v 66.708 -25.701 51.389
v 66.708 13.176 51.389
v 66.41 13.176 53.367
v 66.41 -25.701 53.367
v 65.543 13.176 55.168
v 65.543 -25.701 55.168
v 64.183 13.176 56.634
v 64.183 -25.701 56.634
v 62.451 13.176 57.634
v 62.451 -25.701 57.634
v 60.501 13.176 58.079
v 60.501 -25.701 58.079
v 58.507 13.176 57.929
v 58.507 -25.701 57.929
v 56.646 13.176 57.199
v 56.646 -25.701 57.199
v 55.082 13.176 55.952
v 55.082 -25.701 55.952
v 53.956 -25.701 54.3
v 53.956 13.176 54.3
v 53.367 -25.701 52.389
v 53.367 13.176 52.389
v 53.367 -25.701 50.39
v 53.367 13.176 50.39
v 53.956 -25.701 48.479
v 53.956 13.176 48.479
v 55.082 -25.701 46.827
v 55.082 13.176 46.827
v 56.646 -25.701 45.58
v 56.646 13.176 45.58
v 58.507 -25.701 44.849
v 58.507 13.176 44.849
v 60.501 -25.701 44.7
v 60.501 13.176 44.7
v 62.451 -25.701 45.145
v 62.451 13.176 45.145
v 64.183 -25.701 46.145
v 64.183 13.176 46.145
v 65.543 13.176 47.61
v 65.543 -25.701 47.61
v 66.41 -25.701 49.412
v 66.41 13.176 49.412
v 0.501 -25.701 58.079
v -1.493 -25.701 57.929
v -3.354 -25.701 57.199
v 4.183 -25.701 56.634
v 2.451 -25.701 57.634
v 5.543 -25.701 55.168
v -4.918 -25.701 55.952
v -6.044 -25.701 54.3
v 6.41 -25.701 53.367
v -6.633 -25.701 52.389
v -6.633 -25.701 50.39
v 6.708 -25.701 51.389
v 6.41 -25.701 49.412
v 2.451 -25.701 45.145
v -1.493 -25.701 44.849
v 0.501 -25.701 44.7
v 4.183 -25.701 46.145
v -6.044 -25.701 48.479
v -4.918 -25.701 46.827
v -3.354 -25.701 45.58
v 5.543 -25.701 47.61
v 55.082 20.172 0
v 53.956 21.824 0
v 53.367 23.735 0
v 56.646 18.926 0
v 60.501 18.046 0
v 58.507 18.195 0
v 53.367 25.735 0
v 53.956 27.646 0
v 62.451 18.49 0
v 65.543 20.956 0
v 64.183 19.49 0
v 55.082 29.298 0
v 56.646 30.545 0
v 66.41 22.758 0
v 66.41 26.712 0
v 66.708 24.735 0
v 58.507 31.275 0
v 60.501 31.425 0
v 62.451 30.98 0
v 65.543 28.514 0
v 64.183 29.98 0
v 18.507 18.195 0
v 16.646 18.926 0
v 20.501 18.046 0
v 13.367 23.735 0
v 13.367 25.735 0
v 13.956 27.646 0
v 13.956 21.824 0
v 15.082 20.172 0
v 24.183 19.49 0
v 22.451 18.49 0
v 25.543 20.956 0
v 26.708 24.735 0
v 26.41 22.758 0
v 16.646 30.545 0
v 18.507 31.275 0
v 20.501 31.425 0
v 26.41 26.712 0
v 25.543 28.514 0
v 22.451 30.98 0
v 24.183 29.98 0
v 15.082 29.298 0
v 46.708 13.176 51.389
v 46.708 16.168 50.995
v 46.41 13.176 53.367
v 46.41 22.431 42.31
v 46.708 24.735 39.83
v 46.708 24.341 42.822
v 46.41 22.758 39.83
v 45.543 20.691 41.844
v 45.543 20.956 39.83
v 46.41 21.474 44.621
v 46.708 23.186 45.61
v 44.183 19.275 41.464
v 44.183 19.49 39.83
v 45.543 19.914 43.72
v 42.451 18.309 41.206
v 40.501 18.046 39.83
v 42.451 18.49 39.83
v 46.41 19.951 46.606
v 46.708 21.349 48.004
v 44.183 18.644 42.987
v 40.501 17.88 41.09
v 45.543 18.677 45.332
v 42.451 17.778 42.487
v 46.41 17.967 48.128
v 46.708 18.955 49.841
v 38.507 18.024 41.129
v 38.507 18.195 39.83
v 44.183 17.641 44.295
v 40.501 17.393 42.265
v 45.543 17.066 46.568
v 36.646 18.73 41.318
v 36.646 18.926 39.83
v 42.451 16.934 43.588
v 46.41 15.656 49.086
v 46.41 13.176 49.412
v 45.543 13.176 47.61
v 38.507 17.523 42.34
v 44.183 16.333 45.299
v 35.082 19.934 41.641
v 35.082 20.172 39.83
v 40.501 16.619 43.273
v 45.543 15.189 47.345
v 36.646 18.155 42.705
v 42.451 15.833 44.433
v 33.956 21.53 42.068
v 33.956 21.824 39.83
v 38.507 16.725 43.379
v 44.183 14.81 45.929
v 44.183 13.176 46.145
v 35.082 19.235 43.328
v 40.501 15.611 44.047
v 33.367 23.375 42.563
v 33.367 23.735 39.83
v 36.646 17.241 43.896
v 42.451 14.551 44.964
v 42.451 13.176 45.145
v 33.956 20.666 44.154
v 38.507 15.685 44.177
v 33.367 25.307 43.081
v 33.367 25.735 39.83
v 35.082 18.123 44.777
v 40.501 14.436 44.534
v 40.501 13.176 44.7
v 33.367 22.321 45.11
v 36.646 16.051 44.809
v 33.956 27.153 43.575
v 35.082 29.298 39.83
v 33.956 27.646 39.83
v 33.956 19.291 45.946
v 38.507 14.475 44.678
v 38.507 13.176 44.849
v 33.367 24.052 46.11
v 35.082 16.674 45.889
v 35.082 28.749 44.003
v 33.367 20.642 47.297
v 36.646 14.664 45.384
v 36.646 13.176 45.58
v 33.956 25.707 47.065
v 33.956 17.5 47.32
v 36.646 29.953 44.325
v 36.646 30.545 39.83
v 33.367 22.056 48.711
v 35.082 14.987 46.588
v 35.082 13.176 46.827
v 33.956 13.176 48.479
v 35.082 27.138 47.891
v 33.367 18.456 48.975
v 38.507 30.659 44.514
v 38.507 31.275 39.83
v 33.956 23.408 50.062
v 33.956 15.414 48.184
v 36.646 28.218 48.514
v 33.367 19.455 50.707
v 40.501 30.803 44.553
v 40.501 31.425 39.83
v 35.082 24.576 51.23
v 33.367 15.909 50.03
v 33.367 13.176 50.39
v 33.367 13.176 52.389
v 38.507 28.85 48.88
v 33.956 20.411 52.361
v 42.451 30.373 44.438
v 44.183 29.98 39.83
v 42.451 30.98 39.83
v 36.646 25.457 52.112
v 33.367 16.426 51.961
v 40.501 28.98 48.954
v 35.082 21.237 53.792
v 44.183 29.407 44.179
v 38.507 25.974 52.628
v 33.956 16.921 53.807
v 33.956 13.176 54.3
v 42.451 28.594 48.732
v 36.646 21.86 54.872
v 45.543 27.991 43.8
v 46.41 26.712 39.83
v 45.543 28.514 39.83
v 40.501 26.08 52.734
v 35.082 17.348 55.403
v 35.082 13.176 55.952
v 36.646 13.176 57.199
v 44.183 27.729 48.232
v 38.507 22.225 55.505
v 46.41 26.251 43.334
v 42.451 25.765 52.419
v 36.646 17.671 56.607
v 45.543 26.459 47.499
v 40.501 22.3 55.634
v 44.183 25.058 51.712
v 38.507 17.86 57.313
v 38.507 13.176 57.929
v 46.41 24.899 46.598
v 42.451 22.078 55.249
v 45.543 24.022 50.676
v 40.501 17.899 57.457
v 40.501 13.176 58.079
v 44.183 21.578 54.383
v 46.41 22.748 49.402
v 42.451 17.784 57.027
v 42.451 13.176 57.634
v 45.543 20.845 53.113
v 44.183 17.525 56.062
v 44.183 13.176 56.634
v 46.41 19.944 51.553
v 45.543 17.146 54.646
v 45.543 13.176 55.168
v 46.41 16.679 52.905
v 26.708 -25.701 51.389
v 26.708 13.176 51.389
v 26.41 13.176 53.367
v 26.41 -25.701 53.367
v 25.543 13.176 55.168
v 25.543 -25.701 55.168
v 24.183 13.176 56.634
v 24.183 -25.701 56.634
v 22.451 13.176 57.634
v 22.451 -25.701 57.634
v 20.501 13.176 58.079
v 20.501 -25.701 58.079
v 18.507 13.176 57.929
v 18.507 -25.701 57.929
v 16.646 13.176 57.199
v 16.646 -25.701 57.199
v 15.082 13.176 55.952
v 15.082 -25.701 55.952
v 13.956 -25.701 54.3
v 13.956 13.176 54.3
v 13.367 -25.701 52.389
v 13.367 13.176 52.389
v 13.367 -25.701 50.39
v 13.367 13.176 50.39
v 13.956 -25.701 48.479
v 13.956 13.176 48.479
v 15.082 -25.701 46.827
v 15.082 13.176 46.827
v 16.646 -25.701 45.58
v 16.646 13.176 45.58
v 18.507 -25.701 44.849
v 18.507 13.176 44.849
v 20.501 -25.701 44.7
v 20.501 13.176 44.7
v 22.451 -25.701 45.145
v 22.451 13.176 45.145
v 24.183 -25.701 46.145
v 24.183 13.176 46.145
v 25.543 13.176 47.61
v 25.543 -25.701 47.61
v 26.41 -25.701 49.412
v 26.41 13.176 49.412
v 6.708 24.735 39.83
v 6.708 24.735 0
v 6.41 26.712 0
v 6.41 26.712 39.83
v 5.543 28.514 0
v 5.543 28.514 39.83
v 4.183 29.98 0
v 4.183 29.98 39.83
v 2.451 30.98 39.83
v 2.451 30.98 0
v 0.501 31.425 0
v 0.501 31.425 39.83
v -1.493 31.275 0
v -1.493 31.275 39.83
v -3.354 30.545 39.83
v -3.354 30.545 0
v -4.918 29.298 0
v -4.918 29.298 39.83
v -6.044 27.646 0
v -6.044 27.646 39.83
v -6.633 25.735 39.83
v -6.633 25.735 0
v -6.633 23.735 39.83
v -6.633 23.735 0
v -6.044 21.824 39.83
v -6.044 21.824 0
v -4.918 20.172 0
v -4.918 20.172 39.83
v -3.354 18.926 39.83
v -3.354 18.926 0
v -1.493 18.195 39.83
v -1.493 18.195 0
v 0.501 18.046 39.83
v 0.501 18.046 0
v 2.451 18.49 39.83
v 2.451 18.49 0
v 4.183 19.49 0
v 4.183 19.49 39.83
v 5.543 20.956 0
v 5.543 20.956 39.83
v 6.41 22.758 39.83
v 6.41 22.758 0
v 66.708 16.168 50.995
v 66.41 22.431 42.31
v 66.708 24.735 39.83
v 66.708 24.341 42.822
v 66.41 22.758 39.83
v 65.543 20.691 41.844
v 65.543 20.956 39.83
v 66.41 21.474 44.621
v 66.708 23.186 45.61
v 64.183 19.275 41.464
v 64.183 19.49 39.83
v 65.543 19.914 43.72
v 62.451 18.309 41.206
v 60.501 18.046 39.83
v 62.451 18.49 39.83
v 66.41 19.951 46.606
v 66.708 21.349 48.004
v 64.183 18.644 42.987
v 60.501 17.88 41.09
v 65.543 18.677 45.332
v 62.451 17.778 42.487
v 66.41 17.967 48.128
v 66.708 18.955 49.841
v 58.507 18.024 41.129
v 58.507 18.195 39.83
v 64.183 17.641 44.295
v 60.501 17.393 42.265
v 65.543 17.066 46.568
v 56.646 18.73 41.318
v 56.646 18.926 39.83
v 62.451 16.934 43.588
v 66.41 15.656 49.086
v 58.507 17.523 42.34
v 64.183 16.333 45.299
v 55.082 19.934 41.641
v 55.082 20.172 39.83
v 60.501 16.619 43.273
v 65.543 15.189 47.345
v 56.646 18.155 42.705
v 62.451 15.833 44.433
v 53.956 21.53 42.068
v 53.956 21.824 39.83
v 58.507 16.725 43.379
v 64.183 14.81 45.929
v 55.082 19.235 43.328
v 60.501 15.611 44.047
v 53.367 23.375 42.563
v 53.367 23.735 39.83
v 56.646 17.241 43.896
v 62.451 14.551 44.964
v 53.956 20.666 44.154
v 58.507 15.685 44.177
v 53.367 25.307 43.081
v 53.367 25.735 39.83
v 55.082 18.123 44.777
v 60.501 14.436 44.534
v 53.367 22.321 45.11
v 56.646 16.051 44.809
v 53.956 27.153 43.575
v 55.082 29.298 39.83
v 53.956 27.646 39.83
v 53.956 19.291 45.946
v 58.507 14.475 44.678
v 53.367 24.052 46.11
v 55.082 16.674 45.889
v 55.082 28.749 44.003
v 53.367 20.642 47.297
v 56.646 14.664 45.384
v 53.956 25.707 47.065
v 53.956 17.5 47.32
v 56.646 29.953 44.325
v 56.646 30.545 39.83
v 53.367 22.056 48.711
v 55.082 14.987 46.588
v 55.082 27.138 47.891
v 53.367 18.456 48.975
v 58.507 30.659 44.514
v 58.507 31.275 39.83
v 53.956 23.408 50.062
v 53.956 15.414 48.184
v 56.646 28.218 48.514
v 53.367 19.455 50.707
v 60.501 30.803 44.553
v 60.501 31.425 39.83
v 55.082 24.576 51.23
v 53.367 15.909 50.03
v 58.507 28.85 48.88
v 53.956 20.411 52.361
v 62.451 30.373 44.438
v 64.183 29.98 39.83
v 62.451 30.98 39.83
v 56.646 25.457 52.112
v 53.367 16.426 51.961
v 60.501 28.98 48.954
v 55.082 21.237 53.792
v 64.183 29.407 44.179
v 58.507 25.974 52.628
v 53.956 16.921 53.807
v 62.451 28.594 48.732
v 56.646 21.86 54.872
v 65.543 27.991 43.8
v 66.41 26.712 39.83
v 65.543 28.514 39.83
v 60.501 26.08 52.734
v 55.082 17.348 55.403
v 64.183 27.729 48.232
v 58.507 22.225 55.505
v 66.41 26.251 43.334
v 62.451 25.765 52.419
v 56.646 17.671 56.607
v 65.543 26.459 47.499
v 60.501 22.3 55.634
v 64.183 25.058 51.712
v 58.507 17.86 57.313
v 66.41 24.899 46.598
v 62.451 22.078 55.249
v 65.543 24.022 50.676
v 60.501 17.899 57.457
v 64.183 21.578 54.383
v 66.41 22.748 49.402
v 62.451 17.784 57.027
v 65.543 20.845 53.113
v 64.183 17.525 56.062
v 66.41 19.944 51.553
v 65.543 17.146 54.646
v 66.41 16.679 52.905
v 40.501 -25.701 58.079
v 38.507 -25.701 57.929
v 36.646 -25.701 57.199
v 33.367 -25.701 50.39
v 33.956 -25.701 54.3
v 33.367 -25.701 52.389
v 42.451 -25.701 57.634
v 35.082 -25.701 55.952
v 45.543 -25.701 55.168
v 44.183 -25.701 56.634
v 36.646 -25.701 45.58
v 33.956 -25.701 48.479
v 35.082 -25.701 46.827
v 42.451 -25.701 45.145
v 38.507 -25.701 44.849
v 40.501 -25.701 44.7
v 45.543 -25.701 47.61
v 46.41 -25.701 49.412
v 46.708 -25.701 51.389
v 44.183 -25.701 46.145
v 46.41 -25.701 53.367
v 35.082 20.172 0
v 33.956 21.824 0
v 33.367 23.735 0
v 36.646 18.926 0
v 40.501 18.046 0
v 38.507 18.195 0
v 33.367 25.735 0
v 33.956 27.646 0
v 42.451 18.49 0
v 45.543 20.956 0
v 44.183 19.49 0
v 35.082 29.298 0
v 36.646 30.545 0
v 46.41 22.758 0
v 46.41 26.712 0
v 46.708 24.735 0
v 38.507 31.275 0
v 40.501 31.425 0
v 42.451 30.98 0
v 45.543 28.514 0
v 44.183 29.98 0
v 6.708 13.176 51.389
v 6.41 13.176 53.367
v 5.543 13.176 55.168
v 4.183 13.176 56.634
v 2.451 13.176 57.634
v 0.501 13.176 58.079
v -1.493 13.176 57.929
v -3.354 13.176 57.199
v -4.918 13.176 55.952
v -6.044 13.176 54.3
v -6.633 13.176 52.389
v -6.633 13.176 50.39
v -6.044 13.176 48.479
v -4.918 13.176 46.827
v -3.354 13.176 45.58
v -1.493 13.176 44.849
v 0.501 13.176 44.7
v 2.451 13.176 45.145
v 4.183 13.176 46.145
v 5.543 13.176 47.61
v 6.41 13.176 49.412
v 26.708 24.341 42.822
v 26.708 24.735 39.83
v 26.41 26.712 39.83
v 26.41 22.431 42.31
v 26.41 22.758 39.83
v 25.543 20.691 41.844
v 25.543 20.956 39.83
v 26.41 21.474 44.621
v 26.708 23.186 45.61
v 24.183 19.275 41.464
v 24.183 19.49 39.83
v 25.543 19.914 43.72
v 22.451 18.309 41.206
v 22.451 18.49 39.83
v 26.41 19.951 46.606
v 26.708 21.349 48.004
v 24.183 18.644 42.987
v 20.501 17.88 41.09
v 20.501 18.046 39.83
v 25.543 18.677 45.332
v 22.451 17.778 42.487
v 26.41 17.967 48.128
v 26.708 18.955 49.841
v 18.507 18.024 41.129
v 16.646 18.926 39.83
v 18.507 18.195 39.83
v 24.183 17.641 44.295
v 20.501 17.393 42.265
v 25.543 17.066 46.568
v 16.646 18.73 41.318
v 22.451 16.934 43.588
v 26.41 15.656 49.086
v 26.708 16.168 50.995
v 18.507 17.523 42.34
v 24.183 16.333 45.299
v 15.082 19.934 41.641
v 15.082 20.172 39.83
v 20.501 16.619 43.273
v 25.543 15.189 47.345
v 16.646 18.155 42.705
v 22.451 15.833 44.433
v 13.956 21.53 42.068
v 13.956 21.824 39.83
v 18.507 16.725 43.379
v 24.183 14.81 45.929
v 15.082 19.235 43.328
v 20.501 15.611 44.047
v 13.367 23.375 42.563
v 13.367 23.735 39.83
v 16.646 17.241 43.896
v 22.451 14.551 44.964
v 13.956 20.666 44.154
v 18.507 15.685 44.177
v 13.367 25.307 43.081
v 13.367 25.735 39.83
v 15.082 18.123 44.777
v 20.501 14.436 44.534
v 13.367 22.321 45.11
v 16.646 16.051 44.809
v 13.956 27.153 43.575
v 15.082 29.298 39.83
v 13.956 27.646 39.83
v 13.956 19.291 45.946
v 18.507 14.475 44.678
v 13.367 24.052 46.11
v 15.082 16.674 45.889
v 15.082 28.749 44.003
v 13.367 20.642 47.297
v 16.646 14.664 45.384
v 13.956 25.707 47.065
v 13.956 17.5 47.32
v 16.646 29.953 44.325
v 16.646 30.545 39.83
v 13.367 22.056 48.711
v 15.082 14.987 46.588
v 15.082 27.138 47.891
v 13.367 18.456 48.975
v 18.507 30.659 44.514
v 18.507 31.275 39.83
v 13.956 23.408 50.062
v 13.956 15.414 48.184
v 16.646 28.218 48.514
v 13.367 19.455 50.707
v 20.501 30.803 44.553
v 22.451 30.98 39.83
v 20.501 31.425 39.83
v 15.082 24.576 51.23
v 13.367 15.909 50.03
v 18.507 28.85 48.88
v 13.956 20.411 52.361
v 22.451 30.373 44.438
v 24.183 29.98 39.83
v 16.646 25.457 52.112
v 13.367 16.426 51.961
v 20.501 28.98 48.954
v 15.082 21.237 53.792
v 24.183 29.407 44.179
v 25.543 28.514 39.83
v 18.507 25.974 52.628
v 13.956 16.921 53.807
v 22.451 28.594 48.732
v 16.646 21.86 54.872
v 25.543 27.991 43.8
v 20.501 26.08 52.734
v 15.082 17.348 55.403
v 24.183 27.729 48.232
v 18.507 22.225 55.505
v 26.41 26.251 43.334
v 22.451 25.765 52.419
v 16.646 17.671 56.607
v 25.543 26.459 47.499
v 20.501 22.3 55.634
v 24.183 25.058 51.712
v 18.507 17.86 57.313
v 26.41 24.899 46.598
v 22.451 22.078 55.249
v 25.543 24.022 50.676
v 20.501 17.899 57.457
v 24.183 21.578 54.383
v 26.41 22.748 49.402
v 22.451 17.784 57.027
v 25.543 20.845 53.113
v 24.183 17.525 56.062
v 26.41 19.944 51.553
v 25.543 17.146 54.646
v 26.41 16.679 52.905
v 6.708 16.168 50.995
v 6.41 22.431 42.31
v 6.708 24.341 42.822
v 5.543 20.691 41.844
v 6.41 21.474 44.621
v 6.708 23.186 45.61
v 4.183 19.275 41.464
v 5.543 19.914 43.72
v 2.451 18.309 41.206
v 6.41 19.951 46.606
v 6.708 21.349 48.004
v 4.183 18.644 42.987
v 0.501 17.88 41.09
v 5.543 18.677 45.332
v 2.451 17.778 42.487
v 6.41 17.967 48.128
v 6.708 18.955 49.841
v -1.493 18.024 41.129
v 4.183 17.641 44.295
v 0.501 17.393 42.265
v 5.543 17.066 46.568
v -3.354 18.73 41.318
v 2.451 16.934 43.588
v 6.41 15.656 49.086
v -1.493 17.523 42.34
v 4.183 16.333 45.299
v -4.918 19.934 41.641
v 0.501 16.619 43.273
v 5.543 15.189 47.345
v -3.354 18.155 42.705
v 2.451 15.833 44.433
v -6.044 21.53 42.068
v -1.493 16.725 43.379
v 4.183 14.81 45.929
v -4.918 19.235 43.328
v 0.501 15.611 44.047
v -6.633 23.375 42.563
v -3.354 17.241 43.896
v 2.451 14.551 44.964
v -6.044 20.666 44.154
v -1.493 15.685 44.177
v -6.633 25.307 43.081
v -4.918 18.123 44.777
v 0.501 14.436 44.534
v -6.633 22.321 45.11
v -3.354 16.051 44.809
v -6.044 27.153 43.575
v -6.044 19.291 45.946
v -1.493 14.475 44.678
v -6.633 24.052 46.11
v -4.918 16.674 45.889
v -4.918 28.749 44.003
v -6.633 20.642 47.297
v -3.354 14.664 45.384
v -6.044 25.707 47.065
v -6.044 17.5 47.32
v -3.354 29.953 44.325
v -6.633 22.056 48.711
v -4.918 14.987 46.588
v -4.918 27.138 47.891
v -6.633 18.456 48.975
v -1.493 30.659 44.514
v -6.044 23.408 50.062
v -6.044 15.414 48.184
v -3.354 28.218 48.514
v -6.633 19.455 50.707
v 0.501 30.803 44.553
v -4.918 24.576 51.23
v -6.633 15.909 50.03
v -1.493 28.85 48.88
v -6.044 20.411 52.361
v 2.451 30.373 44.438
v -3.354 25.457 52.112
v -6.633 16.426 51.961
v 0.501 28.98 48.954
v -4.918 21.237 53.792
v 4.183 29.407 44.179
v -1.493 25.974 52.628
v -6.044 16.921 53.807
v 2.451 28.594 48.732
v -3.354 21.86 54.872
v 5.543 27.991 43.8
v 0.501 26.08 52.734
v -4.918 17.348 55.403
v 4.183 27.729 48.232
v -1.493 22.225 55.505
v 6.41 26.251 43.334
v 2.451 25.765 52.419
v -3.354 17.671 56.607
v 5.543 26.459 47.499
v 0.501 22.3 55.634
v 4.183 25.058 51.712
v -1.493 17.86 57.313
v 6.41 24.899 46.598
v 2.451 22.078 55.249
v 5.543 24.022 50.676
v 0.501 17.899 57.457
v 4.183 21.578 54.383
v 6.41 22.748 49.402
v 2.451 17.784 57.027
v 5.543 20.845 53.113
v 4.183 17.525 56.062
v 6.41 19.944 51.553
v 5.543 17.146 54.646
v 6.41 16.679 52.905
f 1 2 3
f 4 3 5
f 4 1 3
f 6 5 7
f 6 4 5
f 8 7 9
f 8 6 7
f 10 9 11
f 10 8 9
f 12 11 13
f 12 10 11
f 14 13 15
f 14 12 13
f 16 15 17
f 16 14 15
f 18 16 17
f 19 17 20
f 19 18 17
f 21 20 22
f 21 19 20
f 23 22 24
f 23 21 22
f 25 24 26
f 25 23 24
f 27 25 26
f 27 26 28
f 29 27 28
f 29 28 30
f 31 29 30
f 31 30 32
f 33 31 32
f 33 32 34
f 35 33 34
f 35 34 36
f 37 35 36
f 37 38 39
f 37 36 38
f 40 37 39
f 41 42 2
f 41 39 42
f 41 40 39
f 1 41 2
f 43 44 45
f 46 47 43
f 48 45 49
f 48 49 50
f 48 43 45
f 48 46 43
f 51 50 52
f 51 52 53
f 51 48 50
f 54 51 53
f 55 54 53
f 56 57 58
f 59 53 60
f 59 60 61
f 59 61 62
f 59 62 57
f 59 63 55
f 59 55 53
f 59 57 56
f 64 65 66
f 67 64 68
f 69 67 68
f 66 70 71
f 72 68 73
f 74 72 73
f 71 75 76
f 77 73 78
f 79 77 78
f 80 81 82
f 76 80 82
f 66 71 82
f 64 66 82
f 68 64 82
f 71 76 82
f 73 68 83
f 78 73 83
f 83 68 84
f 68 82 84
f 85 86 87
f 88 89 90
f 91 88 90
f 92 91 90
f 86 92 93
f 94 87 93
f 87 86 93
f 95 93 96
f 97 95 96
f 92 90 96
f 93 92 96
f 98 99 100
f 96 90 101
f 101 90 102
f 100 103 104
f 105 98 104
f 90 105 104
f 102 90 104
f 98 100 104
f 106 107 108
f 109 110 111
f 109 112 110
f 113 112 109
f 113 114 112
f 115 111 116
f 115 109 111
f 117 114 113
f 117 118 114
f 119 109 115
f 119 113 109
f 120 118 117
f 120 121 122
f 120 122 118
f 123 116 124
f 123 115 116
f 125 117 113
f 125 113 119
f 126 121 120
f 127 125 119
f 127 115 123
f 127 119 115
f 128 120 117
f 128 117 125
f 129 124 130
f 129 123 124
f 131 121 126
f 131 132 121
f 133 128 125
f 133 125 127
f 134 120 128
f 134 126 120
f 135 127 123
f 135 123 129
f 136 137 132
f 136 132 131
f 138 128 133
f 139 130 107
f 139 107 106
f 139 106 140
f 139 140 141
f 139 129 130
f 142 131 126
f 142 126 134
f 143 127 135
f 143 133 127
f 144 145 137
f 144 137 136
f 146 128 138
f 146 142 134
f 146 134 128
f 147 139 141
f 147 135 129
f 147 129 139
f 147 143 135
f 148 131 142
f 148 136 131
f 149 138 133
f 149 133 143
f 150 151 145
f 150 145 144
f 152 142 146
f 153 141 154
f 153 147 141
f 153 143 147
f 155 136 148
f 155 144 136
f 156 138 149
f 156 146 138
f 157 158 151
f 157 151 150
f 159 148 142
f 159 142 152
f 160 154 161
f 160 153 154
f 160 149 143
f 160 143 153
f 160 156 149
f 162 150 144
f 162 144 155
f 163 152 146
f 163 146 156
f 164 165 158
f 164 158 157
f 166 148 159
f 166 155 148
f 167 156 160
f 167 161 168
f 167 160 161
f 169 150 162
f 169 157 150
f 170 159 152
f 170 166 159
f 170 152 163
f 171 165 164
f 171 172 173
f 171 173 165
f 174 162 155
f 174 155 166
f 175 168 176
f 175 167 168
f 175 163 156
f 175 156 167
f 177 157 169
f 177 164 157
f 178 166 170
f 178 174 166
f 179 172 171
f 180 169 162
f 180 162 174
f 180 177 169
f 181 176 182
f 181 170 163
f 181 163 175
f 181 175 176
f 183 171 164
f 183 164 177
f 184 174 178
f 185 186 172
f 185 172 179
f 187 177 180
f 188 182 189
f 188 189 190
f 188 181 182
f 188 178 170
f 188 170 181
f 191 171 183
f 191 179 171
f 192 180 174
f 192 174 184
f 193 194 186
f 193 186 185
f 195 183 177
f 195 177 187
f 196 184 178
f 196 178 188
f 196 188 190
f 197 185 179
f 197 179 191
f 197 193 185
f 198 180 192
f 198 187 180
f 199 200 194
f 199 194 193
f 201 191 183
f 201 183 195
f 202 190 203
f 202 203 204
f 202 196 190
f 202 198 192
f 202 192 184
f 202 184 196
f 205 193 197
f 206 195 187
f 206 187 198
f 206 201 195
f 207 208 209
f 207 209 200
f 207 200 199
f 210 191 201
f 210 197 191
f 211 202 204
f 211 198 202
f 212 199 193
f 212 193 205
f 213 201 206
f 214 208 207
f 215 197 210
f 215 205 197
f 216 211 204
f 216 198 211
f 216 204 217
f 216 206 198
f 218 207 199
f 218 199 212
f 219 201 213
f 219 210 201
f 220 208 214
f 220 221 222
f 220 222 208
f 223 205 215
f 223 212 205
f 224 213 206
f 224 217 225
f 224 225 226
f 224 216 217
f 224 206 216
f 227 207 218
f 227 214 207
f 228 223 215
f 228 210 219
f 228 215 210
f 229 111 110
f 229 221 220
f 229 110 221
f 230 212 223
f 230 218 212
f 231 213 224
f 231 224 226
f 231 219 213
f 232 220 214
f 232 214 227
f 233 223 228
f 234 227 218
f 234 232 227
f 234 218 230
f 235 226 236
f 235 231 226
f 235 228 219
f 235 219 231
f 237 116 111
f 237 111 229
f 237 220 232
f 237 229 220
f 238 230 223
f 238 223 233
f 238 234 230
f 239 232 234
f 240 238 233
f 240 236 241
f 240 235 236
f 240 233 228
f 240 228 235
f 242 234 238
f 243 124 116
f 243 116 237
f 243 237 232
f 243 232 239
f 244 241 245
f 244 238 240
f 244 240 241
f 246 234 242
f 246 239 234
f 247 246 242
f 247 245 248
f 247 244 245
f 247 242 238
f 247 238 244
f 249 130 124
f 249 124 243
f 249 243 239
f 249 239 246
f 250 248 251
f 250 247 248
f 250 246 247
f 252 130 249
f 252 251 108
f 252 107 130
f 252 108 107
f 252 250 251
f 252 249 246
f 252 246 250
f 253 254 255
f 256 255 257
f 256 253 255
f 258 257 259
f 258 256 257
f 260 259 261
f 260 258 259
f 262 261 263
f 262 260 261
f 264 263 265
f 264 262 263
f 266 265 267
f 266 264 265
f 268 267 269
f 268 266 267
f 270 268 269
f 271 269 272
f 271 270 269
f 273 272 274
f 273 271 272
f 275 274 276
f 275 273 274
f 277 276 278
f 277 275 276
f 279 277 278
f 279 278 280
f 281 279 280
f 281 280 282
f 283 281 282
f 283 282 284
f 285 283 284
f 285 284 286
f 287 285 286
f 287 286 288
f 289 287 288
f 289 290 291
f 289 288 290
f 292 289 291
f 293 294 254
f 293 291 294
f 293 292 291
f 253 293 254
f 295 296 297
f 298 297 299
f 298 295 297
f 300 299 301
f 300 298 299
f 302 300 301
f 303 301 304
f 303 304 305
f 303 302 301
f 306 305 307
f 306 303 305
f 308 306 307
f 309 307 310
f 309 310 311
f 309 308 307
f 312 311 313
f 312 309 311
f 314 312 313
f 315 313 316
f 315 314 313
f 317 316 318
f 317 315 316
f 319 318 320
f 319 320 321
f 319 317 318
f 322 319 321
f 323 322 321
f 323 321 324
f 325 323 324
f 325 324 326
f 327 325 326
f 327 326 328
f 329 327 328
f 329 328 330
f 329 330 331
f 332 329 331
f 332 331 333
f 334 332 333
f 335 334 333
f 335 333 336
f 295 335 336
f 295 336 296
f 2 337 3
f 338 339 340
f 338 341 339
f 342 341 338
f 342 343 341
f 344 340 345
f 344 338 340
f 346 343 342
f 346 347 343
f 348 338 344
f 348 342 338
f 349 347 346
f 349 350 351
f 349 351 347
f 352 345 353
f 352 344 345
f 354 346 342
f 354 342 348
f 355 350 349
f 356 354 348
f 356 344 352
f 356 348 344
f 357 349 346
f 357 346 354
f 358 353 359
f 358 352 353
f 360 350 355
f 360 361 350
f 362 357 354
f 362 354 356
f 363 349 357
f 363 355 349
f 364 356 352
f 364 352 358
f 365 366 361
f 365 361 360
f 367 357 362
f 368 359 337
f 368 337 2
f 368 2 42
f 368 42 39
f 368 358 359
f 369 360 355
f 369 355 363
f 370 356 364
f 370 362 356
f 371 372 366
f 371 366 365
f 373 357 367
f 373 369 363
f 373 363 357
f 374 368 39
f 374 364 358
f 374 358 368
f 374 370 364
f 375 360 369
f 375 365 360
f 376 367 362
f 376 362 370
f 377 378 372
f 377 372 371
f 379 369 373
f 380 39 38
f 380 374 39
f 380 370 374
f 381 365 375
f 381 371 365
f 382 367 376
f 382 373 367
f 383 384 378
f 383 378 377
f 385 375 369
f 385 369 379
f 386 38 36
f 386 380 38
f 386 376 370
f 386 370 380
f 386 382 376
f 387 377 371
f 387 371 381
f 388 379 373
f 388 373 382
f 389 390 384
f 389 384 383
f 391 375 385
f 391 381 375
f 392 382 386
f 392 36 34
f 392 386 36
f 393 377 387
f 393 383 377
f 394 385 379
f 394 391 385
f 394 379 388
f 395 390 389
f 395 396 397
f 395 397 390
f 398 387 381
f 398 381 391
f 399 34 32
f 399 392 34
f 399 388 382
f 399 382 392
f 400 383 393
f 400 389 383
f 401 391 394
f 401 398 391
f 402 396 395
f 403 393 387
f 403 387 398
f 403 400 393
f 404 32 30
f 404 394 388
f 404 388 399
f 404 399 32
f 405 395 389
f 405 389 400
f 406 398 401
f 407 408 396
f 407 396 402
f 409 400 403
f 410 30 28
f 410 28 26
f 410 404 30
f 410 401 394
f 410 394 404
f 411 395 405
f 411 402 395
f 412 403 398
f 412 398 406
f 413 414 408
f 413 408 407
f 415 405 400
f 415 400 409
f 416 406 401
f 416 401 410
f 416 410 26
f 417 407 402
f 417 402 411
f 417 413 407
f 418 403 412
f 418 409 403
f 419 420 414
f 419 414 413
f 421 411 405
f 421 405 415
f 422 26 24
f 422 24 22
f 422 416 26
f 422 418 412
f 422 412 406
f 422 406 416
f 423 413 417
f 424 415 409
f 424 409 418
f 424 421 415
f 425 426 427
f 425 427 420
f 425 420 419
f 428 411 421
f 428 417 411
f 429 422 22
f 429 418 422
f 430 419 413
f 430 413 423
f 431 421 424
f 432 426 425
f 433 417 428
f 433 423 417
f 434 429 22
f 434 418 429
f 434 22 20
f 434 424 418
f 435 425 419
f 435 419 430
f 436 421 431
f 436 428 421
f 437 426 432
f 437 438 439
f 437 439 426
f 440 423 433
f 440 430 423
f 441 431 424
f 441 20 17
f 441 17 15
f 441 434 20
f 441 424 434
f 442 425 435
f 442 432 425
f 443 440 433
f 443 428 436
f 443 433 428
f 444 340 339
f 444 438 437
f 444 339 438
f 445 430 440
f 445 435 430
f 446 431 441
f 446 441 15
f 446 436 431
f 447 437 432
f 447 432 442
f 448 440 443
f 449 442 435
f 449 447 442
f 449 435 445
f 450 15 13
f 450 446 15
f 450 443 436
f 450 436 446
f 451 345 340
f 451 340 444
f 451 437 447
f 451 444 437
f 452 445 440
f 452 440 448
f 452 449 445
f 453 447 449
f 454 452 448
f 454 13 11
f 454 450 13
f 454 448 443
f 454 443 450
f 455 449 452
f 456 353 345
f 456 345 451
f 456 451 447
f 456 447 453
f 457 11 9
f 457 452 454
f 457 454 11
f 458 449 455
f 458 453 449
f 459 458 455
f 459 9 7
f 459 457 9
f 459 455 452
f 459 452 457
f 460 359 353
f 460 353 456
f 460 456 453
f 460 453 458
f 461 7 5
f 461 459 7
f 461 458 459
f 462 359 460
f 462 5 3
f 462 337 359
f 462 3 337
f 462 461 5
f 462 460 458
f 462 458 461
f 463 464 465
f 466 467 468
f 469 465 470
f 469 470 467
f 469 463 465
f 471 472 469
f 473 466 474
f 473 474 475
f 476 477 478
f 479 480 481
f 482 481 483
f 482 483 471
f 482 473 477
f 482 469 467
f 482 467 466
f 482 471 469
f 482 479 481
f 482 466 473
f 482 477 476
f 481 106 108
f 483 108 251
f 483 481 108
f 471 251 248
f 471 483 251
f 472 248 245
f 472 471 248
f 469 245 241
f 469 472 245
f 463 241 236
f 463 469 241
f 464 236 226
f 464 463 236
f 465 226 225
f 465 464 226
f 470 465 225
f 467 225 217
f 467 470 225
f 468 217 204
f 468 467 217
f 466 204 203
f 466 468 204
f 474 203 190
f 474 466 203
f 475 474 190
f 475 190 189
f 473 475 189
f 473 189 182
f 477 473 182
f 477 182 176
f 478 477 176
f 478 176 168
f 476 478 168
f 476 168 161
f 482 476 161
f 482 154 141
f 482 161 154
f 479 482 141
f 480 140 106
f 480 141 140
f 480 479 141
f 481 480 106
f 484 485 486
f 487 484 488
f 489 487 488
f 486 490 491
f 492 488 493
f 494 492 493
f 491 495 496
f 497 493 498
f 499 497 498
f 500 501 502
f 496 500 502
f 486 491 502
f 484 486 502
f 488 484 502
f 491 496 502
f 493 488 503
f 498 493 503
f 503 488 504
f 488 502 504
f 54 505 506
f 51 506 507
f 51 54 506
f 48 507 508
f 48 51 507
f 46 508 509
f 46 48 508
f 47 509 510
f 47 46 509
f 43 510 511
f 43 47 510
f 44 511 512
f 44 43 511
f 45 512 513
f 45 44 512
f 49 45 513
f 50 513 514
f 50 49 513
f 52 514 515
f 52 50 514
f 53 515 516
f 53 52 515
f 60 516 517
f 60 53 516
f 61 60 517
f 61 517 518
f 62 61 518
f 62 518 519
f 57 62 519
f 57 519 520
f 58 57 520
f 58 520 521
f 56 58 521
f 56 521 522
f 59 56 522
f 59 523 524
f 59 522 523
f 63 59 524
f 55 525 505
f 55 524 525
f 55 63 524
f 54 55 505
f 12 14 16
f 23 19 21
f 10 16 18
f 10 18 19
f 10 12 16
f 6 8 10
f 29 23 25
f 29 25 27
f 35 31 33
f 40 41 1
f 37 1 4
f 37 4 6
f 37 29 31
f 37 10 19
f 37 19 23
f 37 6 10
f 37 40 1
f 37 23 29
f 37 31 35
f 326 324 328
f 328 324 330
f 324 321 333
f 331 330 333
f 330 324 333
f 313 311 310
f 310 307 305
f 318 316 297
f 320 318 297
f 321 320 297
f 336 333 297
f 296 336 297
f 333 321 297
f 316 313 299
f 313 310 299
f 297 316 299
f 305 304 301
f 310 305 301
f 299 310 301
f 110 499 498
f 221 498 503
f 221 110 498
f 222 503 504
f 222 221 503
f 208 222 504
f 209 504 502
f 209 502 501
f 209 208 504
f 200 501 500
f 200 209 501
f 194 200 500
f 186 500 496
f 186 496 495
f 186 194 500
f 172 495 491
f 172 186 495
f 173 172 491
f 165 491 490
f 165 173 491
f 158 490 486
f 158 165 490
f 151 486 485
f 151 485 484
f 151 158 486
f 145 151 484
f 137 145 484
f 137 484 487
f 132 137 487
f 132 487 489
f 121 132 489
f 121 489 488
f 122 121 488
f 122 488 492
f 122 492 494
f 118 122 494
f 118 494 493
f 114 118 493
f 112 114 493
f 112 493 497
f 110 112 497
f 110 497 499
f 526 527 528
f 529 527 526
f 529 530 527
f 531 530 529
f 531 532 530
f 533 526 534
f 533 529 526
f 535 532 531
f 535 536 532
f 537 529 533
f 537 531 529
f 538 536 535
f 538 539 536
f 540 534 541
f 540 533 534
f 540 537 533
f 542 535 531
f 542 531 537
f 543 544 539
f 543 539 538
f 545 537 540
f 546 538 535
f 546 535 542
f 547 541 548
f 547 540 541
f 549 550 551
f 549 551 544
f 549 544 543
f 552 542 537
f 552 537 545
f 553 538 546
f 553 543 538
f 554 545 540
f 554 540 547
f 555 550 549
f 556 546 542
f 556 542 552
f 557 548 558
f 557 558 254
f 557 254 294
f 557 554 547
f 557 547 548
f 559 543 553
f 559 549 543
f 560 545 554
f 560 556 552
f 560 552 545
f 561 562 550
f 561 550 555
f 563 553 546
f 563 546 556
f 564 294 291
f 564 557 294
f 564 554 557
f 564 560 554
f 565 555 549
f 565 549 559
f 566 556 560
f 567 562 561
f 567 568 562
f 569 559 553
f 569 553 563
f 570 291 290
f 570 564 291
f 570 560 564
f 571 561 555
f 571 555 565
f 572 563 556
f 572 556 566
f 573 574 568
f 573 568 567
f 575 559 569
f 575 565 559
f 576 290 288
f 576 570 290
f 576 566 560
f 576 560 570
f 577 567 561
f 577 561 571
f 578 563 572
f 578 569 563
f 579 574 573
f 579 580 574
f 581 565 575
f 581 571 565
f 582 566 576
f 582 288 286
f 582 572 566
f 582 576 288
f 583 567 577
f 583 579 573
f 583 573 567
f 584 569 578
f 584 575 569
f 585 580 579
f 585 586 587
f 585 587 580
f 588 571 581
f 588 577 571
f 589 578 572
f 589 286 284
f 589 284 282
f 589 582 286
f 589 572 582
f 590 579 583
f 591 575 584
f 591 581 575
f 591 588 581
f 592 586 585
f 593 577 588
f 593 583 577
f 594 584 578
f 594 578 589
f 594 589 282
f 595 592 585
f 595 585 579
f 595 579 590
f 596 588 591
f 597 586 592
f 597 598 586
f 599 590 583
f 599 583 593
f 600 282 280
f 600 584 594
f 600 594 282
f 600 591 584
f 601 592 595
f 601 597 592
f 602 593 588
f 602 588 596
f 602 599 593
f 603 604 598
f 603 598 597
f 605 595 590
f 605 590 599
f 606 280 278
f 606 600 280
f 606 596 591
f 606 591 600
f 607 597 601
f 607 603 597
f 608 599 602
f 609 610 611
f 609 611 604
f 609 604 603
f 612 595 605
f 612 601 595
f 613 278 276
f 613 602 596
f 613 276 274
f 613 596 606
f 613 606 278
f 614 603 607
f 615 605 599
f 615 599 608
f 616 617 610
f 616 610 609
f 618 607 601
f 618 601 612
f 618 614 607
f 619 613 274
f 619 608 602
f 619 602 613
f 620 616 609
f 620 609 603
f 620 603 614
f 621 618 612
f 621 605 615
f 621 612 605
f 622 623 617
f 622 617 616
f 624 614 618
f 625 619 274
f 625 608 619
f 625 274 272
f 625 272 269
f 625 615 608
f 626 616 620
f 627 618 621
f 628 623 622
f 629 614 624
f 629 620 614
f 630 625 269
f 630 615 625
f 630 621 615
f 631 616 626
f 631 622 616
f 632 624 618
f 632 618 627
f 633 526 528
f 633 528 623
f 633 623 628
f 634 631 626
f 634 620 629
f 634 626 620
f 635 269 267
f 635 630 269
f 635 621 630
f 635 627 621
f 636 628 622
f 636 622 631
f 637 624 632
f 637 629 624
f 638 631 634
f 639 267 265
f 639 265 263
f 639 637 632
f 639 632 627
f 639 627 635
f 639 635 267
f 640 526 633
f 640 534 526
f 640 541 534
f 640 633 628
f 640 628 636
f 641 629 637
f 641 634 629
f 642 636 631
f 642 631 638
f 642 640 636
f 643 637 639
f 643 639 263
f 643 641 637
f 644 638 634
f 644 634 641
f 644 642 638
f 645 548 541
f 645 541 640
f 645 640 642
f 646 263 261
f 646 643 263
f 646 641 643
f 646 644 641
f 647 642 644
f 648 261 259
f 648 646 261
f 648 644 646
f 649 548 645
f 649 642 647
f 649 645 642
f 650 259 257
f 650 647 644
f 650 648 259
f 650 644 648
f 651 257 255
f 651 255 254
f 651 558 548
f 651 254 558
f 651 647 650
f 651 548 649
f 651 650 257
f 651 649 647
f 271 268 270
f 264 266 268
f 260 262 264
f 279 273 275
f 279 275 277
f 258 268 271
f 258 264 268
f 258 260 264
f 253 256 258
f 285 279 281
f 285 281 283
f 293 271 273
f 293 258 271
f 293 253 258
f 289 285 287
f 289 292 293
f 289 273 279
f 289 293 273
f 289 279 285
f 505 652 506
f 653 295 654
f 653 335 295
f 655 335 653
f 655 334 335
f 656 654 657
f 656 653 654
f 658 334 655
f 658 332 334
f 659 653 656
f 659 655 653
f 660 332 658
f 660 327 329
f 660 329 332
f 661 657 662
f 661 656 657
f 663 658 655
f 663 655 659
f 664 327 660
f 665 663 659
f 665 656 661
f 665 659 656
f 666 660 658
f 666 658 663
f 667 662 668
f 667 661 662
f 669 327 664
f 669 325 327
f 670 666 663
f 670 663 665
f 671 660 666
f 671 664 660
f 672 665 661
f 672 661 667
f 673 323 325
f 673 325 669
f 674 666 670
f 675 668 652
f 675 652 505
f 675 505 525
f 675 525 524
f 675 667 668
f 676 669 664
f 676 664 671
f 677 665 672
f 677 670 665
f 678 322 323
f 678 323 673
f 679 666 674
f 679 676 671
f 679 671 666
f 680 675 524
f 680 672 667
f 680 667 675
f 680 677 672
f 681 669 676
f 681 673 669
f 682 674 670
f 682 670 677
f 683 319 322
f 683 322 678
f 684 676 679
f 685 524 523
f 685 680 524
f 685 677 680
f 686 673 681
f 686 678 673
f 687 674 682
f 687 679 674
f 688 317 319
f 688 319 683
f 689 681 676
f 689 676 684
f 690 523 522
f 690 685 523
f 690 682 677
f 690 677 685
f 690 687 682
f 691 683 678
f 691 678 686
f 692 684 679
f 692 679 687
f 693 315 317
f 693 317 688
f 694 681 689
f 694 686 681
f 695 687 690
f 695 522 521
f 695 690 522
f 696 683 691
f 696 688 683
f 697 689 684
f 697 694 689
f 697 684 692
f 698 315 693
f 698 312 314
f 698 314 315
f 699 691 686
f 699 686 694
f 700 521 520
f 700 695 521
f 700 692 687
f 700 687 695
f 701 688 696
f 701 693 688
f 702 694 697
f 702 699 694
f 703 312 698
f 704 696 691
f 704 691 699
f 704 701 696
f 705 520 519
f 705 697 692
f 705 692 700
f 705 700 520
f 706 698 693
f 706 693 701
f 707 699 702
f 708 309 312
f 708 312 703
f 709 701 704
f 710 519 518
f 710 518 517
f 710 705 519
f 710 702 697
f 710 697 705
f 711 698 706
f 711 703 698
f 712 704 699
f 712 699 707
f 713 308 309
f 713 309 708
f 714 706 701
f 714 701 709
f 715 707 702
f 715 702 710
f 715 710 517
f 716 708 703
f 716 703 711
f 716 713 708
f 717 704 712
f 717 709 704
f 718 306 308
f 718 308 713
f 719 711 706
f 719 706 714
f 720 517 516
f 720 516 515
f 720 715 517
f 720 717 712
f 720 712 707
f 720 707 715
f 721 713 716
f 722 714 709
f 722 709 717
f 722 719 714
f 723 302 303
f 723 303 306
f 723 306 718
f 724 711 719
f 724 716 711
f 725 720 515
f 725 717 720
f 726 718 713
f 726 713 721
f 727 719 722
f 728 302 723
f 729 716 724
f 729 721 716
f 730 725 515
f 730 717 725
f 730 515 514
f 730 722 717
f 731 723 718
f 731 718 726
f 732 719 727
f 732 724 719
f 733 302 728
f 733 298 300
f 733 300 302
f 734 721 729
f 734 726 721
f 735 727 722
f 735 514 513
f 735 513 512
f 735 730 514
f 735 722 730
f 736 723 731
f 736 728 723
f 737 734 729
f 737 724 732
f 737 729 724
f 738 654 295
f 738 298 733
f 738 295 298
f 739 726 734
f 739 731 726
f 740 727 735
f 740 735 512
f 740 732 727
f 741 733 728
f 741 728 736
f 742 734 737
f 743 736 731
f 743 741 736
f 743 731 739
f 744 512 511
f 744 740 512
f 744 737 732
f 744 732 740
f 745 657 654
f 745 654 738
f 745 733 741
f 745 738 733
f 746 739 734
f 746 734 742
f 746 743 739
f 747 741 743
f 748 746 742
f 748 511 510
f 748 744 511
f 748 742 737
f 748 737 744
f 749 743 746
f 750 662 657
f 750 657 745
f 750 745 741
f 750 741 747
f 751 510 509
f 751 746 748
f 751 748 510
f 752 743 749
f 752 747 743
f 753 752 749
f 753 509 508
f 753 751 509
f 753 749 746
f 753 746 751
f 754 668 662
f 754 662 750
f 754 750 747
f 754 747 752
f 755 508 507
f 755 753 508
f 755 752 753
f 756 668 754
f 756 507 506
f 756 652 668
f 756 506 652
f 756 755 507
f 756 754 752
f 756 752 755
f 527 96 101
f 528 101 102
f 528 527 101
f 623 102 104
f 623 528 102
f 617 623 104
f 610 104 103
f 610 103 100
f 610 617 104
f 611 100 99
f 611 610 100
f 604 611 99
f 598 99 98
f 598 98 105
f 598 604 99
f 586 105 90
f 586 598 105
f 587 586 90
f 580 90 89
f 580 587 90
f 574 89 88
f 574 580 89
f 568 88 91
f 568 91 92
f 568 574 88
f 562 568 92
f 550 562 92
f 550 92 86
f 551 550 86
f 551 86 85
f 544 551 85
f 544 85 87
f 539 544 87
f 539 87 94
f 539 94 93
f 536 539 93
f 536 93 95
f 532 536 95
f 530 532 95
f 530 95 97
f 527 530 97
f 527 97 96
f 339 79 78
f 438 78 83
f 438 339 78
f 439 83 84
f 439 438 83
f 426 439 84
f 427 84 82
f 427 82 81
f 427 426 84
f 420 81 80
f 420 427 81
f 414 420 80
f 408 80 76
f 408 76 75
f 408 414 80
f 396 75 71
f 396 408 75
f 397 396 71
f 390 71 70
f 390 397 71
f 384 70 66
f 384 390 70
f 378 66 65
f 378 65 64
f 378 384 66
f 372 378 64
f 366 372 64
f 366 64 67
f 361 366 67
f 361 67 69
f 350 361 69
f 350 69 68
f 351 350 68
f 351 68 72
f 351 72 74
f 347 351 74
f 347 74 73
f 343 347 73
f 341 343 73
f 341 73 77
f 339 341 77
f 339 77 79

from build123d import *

# Parameters (mm, degrees)
SKETCH1_R = 6.708334263


with BuildPart() as part:
    # Sweep1: sweep along a path in Sketch2
    with BuildLine(Plane(origin=(0, 0, 0), x_dir=(0, 0, -1), z_dir=(1, 0, 0))) as sweep1_path:
        Line((0, 24.735101447), (-39.829973559, 24.735101447))
        ThreePointArc((-39.829973559, 24.735101447), (-48.003682266, 21.349440446), (-51.389343267, 13.175731739))
        Line((-51.389343267, 13.175731739), (-51.389343267, -25.700745291))
    # Sketch1 → Sweep1 (sweep)
    with BuildSketch(Plane.XY):
        with Locations((0, 24.735101447)):
            Circle(SKETCH1_R)
        with Locations((20, 24.735101447)):
            Circle(SKETCH1_R)
        with Locations((40, 24.735101447)):
            Circle(SKETCH1_R)
        with Locations((60, 24.735101447)):
            Circle(SKETCH1_R)
    sweep(path=sweep1_path.line)


solid = part.part
